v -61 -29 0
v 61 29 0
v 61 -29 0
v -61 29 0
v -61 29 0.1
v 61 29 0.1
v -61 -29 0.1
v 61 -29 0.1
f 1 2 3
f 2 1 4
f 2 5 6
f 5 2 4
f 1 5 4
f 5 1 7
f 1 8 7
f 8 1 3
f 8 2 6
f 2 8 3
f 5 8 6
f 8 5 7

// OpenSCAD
// file: ../p/box5-12.scad
use <../lib.scad>
function ldraw_lib__box5_12() = [
// 0 Box with 5 Faces without Any Edges
// 0 Name: box5-12.dat
// 0 Author: Chris Dee [cwdee]
// 0 !LDRAW_ORG Primitive UPDATE 2009-02
// 0 !LICENSE Licensed under CC BY 2.0 and CC BY 4.0 : see CAreadme.txt
// 
// 0 BFC CERTIFY CCW
  [0,"BFC","CERTIFY"],
  [0,"BFC","CCW"],
// 
// 0 !HISTORY 2009-09-03 [PTadmin] Official Update 2009-02
// 
// 
// 4 16 1 1 1 1 1 -1 -1 1 -1 -1 1 1
  [4,16,1,1,1,1,1,-1,-1,1,-1,-1,1,1],
// 4 16 -1 0 1 1 0 1 1 1 1 -1 1 1
  [4,16,-1,0,1,1,0,1,1,1,1,-1,1,1],
// 4 16 -1 0 -1 -1 0 1 -1 1 1 -1 1 -1
  [4,16,-1,0,-1,-1,0,1,-1,1,1,-1,1,-1],
// 4 16 1 0 -1 -1 0 -1 -1 1 -1 1 1 -1
  [4,16,1,0,-1,-1,0,-1,-1,1,-1,1,1,-1],
// 4 16 1 0 1 1 0 -1 1 1 -1 1 1 1
  [4,16,1,0,1,1,0,-1,1,1,-1,1,1,1],
// 0
];
makepoly(ldraw_lib__box5_12(), line=0.2);
// main file
use <../lib.scad>
use <../p/box5-12.scad>
function ldraw_lib__6299663d() = [
// 0 Sticker  7.2 x 15.2 with Star Wars A-Wing Starfighter Specifications
// 0 Name: 6299663d.dat
// 0 Author: Evert-Jan Boer [ejboer]
// 0 !LDRAW_ORG Part UPDATE 2020-03
// 0 !LICENSE Licensed under CC BY 2.0 and CC BY 4.0 : see CAreadme.txt
// 
// 0 BFC CERTIFY CCW
  [0,"BFC","CERTIFY"],
  [0,"BFC","CCW"],
// 
// 0 !KEYWORDS Set 75275, UCS
// 
// 0 !HISTORY 2020-12-29 [PTadmin] Official Update 2020-03
// 
// 
// 1 16 0 -0.25 0 152.5 0 0 0 0.25 0 0 0 72.5 box5-12.dat
  [1,16,0,-0.25,0,152.5,0,0,0,0.25,0,0,0,72.5, ldraw_lib__box5_12()],
// 
// 0 !TEXMAP START PLANAR -152.5 -0.25 72.5 152.5 -0.25 72.5 -152.5 -0.25 -72.5 6299663d.png
// 0 !: 4 0 152.5 -0.25 72.5 -152.5 -0.25 72.5 -152.5 -0.25 -72.5 152.5 -0.25 -72.5
// 0 !TEXMAP FALLBACK
// 0 // Needs Work: fallback pattern
// 4 0 152.5 -0.25 72.5 -152.5 -0.25 72.5 -152.5 -0.25 -72.5 152.5 -0.25 -72.5
  [4,0,152.5,-0.25,72.5,-152.5,-0.25,72.5,-152.5,-0.25,-72.5,152.5,-0.25,-72.5],
// 0 !TEXMAP END
];
makepoly(ldraw_lib__6299663d(), line=0.2);
